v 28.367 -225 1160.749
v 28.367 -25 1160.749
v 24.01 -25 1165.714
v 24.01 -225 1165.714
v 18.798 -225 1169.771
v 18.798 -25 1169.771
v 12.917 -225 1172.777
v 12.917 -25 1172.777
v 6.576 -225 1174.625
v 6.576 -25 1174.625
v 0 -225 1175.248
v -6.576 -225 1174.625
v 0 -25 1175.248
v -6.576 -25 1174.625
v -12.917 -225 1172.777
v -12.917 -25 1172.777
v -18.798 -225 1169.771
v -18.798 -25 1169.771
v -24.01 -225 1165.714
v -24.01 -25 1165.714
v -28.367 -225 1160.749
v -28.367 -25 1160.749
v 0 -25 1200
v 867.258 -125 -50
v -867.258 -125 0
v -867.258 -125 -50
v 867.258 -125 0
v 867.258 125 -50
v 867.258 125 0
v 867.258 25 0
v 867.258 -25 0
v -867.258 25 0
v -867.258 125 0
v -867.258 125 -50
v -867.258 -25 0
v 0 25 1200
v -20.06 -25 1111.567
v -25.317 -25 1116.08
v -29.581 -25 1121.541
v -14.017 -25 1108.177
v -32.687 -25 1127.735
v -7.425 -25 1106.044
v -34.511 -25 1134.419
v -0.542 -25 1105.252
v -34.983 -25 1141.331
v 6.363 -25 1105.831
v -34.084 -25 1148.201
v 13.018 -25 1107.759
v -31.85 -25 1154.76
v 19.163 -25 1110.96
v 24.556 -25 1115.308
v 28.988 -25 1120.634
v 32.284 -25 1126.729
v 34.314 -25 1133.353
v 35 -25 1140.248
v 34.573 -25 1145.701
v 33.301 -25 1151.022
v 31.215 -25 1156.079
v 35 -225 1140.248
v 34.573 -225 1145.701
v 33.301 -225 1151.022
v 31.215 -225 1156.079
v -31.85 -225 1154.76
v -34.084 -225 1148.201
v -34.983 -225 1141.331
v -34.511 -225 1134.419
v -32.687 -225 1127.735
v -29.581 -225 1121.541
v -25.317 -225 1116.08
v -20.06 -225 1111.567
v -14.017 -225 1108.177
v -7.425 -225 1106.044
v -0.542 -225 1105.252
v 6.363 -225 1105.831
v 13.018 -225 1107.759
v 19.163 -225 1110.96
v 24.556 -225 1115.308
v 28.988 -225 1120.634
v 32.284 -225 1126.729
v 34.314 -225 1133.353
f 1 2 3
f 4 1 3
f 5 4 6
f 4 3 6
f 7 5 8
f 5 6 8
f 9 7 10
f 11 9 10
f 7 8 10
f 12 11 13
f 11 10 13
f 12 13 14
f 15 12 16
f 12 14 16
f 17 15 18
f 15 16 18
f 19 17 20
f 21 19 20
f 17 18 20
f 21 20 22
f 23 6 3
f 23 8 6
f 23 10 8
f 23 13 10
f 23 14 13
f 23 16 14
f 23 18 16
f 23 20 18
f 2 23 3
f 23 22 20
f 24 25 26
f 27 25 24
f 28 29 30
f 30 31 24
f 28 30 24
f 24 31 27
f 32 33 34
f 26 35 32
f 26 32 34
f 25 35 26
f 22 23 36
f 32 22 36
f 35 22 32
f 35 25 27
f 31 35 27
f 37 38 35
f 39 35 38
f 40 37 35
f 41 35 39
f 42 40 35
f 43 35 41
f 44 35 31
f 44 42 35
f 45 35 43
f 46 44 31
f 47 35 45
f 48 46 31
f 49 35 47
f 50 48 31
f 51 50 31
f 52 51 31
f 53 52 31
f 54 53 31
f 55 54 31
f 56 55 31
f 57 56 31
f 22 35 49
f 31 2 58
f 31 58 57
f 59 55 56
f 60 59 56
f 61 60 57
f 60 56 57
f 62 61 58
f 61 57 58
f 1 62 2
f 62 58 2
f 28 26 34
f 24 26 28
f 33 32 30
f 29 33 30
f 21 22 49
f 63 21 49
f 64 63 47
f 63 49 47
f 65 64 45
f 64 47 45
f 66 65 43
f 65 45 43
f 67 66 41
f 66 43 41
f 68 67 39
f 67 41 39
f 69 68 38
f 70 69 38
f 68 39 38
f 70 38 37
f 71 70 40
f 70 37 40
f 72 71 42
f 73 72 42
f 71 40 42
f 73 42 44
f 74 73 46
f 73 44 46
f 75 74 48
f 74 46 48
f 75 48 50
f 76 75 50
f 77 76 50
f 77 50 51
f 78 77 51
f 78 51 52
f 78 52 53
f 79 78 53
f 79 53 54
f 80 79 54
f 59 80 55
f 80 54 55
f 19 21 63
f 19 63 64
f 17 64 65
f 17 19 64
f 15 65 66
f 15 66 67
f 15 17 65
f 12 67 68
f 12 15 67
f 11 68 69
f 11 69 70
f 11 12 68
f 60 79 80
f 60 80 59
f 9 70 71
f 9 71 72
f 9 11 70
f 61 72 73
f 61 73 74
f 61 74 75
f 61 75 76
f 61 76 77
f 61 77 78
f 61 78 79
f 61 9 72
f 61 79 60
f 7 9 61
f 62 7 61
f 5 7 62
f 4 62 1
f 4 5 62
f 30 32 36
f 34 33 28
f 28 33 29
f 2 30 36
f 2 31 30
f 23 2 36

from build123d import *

# Parameters (mm, degrees)
F1_DEPTH   = 25
F3_DEPTH   = 200
F4_W       = 1734.5163099376
F4_H       = 100
F1_FACE1_W = 1734.5163099376
F1_FACE1_H = 50
F5_DEPTH   = 50


with BuildPart() as f1:
    # F0 (on Front) → F1 (new body, symmetric)
    with BuildSketch(Plane.XZ):
        Polygon((0, 1200), (-867.2581549688, 0), (867.2581549688, 0), align=None)
    extrude(amount=F1_DEPTH, both=True)

    # F2 (on face) → F3 (join)
    with BuildSketch(Plane.XZ.offset(25)):
        with BuildLine():
            ThreePointArc((-28.3671346864, 1160.7492170254), (-10.7738174752, 1106.9473358987), (35, 1140.2478592731))
            ThreePointArc((35, 1140.2478592731), (33.3005233016, 1151.0216769733), (28.3671344093, 1160.7492174087))
            ThreePointArc((28.3671344093, 1160.7492174087), (-2.365e-07, 1175.2478592731), (-28.3671346864, 1160.7492170254))
        make_face()
    extrude(amount=F3_DEPTH)

    # F4 (on face) + F1_face1 (on face) → F5 (join)
    with BuildSketch(Plane(origin=(0, 0, 0), x_dir=(1, 0, 0), z_dir=(0, 0, -1))):
        with Locations((0, 75)):
            Rectangle(F4_W, F4_H)
        with Locations((0, -75)):
            Rectangle(F4_W, F4_H)
    with BuildSketch(Plane(origin=(0, 0, 0), x_dir=(1, 0, 0), z_dir=(0, 0, -1))):
        Rectangle(F1_FACE1_W, F1_FACE1_H)
    extrude(amount=F5_DEPTH)


solid = f1.part
